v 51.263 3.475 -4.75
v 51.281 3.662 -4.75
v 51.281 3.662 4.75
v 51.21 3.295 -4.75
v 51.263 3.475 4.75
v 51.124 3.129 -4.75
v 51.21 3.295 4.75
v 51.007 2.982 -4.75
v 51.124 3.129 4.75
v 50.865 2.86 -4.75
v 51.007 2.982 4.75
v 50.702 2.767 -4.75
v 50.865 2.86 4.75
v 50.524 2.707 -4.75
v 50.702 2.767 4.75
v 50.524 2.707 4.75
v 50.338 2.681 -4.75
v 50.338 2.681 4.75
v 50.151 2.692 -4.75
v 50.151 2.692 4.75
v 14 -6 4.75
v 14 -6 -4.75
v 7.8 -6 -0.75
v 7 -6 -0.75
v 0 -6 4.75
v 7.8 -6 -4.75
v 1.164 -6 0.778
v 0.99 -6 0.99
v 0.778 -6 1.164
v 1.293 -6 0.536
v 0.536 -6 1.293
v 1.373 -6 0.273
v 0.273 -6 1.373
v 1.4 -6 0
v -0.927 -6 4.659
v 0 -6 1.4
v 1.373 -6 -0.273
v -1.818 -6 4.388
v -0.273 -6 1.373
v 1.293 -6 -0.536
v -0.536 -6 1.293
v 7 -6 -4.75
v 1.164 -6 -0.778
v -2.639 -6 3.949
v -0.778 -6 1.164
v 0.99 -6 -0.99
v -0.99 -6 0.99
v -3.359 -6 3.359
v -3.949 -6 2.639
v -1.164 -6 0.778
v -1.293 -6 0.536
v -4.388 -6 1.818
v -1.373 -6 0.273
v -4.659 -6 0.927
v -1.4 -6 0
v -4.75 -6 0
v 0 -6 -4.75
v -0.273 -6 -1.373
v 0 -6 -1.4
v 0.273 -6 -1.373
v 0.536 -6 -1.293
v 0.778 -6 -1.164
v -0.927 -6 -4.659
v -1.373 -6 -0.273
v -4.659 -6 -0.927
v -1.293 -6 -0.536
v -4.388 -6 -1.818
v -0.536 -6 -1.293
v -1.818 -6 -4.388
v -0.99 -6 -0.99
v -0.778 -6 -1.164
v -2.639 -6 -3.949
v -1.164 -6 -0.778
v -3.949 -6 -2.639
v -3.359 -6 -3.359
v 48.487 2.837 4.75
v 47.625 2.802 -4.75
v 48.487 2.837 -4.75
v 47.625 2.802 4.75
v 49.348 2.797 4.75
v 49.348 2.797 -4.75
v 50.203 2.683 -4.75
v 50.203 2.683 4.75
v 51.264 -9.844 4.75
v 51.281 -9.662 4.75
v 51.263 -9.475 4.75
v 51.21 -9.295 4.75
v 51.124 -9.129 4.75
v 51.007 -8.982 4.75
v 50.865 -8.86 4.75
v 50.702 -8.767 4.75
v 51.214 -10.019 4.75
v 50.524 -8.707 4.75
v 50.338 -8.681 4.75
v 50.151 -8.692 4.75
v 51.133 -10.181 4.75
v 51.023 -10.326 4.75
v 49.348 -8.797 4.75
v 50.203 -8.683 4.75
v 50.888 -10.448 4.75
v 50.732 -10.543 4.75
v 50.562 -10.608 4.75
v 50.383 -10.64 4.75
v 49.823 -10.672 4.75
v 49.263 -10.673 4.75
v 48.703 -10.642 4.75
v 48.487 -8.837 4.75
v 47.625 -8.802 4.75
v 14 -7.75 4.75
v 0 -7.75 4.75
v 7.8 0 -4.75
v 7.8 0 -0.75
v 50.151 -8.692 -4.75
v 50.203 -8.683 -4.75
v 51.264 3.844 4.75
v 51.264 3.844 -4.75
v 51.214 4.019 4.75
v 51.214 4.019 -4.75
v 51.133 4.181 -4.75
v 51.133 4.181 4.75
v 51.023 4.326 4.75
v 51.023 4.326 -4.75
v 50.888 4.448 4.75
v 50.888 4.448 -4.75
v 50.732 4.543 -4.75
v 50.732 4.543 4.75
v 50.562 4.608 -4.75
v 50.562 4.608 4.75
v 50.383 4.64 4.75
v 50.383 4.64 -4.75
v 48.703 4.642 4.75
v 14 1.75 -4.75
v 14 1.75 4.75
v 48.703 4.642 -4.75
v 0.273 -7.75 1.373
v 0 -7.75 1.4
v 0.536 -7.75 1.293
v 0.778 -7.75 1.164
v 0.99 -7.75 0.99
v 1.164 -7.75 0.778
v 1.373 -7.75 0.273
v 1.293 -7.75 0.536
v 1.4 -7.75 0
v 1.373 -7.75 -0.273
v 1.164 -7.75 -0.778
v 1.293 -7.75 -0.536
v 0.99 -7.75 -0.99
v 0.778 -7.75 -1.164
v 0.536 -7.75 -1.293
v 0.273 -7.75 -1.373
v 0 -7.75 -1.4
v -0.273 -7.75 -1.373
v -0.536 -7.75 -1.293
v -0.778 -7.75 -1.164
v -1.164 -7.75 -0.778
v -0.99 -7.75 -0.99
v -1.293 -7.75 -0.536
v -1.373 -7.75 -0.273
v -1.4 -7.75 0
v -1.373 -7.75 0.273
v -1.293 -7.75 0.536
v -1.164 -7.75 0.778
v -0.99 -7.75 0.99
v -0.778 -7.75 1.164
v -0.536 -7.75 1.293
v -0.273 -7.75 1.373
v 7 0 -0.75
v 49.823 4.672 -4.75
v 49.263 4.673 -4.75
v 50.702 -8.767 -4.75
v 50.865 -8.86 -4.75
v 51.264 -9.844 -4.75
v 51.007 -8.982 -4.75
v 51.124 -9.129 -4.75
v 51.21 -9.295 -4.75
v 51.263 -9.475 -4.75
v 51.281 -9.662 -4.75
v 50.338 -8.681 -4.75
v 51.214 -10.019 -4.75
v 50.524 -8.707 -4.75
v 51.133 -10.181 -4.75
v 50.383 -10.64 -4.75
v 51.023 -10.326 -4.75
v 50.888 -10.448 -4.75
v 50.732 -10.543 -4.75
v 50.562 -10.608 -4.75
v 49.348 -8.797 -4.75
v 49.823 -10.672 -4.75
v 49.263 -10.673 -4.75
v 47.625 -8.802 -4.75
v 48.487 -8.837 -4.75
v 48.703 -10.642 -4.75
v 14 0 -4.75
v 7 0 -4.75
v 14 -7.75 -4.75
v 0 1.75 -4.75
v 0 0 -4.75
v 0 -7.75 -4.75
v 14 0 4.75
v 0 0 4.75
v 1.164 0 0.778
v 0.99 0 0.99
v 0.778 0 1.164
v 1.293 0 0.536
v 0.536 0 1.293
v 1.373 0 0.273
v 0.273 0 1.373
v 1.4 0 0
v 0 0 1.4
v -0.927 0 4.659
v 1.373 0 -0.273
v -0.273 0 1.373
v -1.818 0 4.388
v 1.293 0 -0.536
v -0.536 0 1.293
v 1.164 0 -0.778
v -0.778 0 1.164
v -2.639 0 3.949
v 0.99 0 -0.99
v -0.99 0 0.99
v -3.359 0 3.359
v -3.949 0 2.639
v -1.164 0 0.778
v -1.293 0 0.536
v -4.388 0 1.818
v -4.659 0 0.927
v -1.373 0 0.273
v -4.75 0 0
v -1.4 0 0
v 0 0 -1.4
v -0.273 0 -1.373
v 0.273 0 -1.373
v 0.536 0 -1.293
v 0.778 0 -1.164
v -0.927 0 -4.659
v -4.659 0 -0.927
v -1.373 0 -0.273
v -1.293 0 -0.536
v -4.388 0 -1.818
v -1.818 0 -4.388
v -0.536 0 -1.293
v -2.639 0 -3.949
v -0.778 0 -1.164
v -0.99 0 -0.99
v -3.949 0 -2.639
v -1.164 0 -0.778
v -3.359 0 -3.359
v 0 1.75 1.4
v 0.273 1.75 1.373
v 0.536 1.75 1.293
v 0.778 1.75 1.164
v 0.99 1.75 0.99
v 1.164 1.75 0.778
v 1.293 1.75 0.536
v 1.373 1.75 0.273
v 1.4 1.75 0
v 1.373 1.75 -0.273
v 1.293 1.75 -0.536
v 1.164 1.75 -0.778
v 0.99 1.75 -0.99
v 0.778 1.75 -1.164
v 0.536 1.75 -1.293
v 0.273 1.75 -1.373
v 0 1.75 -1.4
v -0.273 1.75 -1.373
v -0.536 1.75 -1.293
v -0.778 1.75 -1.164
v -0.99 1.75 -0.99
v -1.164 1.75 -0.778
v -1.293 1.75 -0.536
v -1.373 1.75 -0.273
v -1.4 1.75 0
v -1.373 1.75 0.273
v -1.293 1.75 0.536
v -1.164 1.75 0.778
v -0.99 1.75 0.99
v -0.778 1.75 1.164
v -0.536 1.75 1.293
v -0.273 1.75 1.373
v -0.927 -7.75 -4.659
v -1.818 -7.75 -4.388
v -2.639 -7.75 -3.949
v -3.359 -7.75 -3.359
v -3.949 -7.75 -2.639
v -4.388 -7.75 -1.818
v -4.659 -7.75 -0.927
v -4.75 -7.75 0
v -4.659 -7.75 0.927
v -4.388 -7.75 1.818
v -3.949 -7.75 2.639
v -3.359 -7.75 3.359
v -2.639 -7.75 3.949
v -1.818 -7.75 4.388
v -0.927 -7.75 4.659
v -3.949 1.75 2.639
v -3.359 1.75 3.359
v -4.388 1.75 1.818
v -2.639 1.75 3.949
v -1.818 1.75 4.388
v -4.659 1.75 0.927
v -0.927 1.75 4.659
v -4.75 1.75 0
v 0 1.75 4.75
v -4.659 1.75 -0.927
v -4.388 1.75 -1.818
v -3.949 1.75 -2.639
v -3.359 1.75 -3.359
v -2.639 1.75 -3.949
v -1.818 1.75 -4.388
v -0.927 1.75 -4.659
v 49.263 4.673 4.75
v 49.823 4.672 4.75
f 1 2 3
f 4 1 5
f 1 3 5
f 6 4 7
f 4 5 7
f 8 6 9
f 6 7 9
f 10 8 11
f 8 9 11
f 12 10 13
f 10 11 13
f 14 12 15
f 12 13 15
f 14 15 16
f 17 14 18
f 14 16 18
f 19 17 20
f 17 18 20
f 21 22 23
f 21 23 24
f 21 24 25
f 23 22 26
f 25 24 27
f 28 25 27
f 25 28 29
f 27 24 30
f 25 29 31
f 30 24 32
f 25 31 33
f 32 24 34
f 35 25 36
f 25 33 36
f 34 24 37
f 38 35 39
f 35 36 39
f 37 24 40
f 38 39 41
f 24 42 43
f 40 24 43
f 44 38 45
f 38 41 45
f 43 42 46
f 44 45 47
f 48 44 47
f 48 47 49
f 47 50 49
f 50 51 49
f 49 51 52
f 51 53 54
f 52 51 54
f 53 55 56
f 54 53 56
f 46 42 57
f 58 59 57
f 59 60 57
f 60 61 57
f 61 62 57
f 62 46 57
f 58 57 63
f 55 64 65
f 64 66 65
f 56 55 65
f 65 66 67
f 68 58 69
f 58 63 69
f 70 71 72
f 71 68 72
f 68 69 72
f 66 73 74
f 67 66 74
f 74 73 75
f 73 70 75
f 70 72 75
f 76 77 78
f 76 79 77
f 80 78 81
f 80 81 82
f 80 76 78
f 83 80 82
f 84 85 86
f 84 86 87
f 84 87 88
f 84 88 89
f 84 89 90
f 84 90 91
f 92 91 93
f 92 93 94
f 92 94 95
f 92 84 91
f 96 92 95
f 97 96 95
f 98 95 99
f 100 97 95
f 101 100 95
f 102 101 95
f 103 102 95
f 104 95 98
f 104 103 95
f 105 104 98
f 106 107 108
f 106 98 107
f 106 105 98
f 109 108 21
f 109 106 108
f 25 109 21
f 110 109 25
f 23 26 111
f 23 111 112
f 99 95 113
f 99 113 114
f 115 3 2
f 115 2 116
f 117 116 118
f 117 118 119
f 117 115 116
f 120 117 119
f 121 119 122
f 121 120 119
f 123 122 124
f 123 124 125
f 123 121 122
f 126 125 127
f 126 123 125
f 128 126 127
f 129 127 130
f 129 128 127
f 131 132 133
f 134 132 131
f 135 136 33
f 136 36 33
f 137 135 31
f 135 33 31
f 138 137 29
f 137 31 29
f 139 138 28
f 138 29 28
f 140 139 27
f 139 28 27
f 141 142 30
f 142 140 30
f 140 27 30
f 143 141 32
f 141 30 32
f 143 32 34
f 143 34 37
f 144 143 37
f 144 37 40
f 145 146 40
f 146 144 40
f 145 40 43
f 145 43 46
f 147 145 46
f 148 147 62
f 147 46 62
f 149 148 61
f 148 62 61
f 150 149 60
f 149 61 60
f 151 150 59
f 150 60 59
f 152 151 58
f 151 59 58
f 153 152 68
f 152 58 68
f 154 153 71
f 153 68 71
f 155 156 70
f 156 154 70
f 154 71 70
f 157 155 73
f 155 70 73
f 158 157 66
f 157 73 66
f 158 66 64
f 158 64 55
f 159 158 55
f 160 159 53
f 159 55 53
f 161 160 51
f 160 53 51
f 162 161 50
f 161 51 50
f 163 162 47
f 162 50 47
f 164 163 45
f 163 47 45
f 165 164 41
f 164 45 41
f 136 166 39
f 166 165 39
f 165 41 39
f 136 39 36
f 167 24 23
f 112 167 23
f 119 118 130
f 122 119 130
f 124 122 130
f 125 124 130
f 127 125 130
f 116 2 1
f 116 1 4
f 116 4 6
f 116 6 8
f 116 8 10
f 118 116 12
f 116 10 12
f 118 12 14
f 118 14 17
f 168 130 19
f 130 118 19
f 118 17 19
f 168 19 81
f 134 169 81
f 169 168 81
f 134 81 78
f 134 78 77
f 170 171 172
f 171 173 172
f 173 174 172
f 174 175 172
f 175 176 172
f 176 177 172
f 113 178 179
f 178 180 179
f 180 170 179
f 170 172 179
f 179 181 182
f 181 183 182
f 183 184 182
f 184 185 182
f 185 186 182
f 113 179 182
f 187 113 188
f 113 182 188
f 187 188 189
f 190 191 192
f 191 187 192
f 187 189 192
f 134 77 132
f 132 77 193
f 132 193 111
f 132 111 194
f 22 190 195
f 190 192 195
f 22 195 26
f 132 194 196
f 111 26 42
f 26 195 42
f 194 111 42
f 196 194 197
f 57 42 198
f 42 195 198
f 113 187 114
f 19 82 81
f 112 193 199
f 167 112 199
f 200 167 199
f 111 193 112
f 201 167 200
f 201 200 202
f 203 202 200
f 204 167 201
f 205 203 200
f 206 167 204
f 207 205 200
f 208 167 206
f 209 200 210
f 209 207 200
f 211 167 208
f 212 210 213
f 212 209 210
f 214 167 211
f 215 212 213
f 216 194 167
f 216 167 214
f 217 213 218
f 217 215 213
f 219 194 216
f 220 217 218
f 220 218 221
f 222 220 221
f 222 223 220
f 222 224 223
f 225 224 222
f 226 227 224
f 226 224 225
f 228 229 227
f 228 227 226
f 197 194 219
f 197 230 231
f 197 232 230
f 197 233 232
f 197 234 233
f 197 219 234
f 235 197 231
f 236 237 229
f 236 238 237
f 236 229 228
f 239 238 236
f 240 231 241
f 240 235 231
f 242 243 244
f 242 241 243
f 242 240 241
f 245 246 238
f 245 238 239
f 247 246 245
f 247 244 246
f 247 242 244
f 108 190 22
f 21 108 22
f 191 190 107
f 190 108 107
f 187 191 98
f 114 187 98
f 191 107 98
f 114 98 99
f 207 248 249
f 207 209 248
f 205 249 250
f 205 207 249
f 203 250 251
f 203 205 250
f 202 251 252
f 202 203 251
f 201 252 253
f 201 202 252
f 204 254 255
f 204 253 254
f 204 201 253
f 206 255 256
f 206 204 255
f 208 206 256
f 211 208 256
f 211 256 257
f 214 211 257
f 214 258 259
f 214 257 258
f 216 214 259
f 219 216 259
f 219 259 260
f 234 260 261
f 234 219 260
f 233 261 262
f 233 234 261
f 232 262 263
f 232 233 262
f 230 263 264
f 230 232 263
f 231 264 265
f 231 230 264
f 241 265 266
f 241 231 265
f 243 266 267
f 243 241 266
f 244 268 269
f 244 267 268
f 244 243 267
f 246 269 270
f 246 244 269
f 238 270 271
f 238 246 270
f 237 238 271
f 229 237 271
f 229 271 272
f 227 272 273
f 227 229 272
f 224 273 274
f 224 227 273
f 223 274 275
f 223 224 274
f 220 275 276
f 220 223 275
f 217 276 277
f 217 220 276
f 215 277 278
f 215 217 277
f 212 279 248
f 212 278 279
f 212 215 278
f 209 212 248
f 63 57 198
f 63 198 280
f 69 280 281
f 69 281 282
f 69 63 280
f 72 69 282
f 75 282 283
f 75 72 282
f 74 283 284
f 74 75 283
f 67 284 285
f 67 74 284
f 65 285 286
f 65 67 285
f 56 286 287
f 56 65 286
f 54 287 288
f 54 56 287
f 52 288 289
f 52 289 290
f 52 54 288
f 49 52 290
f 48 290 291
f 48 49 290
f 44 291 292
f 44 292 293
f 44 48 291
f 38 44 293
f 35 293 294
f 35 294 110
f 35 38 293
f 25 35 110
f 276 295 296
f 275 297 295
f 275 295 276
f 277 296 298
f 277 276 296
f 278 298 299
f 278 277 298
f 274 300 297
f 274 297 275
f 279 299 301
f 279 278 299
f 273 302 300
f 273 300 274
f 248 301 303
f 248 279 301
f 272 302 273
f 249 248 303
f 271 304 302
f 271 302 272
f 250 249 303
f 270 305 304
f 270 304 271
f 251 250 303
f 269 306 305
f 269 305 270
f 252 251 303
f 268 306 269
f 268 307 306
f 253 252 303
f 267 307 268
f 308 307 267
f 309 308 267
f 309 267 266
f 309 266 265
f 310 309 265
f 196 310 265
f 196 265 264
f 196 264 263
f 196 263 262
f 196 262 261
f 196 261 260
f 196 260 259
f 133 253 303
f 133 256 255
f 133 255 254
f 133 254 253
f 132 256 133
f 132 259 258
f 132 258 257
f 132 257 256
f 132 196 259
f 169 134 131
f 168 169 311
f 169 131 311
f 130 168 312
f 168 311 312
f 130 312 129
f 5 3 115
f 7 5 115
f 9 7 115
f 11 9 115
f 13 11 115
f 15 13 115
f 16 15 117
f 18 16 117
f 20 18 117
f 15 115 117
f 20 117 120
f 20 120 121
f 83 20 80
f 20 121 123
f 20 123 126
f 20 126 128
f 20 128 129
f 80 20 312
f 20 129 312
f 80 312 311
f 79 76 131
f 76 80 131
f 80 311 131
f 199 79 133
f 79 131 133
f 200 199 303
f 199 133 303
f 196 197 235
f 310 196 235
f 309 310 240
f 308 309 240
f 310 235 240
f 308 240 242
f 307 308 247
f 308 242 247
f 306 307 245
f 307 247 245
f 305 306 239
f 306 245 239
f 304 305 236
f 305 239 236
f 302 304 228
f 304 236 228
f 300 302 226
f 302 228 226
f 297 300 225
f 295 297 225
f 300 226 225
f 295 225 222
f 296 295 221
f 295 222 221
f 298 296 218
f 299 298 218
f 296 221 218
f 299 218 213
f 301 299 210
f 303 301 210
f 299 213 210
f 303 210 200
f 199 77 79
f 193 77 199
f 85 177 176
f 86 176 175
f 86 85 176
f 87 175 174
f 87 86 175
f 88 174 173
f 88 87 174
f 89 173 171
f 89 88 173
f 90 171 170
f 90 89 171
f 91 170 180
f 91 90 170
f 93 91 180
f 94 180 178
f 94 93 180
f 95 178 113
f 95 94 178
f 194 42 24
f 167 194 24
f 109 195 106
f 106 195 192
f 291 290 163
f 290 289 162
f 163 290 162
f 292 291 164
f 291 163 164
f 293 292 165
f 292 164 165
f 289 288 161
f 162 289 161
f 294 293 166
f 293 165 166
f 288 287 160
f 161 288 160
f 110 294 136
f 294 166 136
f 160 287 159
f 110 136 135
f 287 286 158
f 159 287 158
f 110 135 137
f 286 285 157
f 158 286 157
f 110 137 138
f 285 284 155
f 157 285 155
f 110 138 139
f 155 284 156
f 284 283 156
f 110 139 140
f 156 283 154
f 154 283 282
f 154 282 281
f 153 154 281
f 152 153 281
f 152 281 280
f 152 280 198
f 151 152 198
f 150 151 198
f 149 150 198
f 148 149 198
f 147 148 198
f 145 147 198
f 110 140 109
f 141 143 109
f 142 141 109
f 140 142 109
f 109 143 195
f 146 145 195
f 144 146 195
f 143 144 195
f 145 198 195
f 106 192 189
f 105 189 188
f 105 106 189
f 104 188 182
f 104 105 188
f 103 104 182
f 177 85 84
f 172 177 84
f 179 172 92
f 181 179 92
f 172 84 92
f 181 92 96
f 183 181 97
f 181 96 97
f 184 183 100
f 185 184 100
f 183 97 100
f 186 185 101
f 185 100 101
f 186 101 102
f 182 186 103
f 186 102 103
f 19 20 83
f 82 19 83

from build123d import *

# Parameters (mm, degrees)
SKETCH_1_R           = 4.75
SKETCH_1_R_2         = 1.4
EXTRUDE_1_DEPTH      = 1.75
EXTRUDE_2_DEPTH      = 4.75
EXTRUDE_2_DEPTH_BACK = 4.75
SKETCH_3_R           = 1.4
CUT_EXTRUDE_1_DEPTH  = 71.22508455
FILLET_1_R           = 10
FILLET_2_R           = 10
SKETCH_5_W           = 18.718698013
SKETCH_5_H           = 4.522568897
CUT_EXTRUDE_3_DEPTH  = 71.796323339
CUT_EXTRUDE_4_DEPTH  = 53.363072215
CUT_EXTRUDE_5_DEPTH  = 53.363072215
SKETCH_10_W          = 0.8
SKETCH_10_H          = 4
EXTRUDE_3_DEPTH      = 3


with BuildPart() as part:
    # 草图1 → 凸台-拉伸1 (new body)
    with BuildSketch(Plane(origin=(0, 0, 0), x_dir=(1, 0, 0), z_dir=(0, 1, 0))):
        Circle(SKETCH_1_R)
        Circle(SKETCH_1_R_2, mode=Mode.SUBTRACT)
    extrude(amount=EXTRUDE_1_DEPTH)

    # 草图2 → 凸台-拉伸2 (add, two sides: drawn at the far end of the back side and taken through both)
    with BuildSketch(Plane.XY.offset(-EXTRUDE_2_DEPTH_BACK)):
        Polygon((14, 1.75), (50, 4.75), (70, 1.2), (70, 0), (65.316834236, 0), (48.921679528, 2.910139961), (14, 0), (0, 0), (0, 1.75), align=None)
    extrude(amount=EXTRUDE_2_DEPTH + EXTRUDE_2_DEPTH_BACK)

    # 草图3 → 切除-拉伸1 (cut, through all)
    with BuildSketch(Plane(origin=(0, 1.75, 0), x_dir=(1, 0, 0), z_dir=(0, 1, 0))):
        Circle(SKETCH_3_R)
    extrude(amount=-CUT_EXTRUDE_1_DEPTH, mode=Mode.SUBTRACT)

    # 圆角1
    fillet_1_edges = [part.edges().sort_by_distance(p)[0] for p in [
        (50, 4.75, 0),
        (48.921679528, 2.910139961, 0),
    ]]
    fillet(fillet_1_edges, radius=FILLET_1_R)

    # 圆角2
    fillet_2_edges = [part.edges().sort_by_distance(p)[0] for p in [
        (65.316834236, 0, 0),
    ]]
    fillet(fillet_2_edges, radius=FILLET_2_R)

    # 草图5 → 切除-拉伸3 (cut, through all)
    with BuildSketch(Plane.XY.offset(4.75)):
        with Locations((60.640650994, 2.261284449)):
            Rectangle(SKETCH_5_W, SKETCH_5_H)
    extrude(amount=-CUT_EXTRUDE_3_DEPTH, mode=Mode.SUBTRACT)

    # 草图6 → 切除-拉伸4 (cut, through all)
    with BuildSketch(Plane.XY.offset(4.75)):
        with BuildLine():
            Line((51.281301987, 4.522568897), (51.281301987, 3.662250428))
            ThreePointArc((51.281301987, 3.662250428), (51.022669477, 4.326231546), (50.383057367, 4.640330335))
            ThreePointArc((50.383057367, 4.640330335), (50.833513908, 4.591626686), (51.281301987, 4.522568897))
        make_face()
    extrude(amount=-CUT_EXTRUDE_4_DEPTH, mode=Mode.SUBTRACT)

    # 草图7 → 切除-拉伸5 (cut, through all)
    with BuildSketch(Plane.XY.offset(4.75)):
        with BuildLine():
            Line((51.281301987, 2.491306974), (51.281301987, 3.662250428))
            ThreePointArc((51.281301987, 3.662250428), (50.938888433, 2.917268377), (50.150530669, 2.692018883))
            Line((50.150530669, 2.692018883), (50.202981515, 2.682708858))
            Line((50.202981515, 2.682708858), (51.281301987, 2.491306974))
        make_face()
    extrude(amount=-CUT_EXTRUDE_5_DEPTH, mode=Mode.SUBTRACT)

    # 草图10 → 凸台-拉伸3 (add)
    with BuildSketch(Plane.XZ):
        with Locations((7.4, -2.75)):
            Rectangle(SKETCH_10_W, SKETCH_10_H)
    extrude(amount=EXTRUDE_3_DEPTH)

    # 镜向1: part across plane


with BuildPart() as part_1:
    add(part.part)
    add(part.part.mirror(Plane.ZX.offset(-3)))


solid = part_1.part
